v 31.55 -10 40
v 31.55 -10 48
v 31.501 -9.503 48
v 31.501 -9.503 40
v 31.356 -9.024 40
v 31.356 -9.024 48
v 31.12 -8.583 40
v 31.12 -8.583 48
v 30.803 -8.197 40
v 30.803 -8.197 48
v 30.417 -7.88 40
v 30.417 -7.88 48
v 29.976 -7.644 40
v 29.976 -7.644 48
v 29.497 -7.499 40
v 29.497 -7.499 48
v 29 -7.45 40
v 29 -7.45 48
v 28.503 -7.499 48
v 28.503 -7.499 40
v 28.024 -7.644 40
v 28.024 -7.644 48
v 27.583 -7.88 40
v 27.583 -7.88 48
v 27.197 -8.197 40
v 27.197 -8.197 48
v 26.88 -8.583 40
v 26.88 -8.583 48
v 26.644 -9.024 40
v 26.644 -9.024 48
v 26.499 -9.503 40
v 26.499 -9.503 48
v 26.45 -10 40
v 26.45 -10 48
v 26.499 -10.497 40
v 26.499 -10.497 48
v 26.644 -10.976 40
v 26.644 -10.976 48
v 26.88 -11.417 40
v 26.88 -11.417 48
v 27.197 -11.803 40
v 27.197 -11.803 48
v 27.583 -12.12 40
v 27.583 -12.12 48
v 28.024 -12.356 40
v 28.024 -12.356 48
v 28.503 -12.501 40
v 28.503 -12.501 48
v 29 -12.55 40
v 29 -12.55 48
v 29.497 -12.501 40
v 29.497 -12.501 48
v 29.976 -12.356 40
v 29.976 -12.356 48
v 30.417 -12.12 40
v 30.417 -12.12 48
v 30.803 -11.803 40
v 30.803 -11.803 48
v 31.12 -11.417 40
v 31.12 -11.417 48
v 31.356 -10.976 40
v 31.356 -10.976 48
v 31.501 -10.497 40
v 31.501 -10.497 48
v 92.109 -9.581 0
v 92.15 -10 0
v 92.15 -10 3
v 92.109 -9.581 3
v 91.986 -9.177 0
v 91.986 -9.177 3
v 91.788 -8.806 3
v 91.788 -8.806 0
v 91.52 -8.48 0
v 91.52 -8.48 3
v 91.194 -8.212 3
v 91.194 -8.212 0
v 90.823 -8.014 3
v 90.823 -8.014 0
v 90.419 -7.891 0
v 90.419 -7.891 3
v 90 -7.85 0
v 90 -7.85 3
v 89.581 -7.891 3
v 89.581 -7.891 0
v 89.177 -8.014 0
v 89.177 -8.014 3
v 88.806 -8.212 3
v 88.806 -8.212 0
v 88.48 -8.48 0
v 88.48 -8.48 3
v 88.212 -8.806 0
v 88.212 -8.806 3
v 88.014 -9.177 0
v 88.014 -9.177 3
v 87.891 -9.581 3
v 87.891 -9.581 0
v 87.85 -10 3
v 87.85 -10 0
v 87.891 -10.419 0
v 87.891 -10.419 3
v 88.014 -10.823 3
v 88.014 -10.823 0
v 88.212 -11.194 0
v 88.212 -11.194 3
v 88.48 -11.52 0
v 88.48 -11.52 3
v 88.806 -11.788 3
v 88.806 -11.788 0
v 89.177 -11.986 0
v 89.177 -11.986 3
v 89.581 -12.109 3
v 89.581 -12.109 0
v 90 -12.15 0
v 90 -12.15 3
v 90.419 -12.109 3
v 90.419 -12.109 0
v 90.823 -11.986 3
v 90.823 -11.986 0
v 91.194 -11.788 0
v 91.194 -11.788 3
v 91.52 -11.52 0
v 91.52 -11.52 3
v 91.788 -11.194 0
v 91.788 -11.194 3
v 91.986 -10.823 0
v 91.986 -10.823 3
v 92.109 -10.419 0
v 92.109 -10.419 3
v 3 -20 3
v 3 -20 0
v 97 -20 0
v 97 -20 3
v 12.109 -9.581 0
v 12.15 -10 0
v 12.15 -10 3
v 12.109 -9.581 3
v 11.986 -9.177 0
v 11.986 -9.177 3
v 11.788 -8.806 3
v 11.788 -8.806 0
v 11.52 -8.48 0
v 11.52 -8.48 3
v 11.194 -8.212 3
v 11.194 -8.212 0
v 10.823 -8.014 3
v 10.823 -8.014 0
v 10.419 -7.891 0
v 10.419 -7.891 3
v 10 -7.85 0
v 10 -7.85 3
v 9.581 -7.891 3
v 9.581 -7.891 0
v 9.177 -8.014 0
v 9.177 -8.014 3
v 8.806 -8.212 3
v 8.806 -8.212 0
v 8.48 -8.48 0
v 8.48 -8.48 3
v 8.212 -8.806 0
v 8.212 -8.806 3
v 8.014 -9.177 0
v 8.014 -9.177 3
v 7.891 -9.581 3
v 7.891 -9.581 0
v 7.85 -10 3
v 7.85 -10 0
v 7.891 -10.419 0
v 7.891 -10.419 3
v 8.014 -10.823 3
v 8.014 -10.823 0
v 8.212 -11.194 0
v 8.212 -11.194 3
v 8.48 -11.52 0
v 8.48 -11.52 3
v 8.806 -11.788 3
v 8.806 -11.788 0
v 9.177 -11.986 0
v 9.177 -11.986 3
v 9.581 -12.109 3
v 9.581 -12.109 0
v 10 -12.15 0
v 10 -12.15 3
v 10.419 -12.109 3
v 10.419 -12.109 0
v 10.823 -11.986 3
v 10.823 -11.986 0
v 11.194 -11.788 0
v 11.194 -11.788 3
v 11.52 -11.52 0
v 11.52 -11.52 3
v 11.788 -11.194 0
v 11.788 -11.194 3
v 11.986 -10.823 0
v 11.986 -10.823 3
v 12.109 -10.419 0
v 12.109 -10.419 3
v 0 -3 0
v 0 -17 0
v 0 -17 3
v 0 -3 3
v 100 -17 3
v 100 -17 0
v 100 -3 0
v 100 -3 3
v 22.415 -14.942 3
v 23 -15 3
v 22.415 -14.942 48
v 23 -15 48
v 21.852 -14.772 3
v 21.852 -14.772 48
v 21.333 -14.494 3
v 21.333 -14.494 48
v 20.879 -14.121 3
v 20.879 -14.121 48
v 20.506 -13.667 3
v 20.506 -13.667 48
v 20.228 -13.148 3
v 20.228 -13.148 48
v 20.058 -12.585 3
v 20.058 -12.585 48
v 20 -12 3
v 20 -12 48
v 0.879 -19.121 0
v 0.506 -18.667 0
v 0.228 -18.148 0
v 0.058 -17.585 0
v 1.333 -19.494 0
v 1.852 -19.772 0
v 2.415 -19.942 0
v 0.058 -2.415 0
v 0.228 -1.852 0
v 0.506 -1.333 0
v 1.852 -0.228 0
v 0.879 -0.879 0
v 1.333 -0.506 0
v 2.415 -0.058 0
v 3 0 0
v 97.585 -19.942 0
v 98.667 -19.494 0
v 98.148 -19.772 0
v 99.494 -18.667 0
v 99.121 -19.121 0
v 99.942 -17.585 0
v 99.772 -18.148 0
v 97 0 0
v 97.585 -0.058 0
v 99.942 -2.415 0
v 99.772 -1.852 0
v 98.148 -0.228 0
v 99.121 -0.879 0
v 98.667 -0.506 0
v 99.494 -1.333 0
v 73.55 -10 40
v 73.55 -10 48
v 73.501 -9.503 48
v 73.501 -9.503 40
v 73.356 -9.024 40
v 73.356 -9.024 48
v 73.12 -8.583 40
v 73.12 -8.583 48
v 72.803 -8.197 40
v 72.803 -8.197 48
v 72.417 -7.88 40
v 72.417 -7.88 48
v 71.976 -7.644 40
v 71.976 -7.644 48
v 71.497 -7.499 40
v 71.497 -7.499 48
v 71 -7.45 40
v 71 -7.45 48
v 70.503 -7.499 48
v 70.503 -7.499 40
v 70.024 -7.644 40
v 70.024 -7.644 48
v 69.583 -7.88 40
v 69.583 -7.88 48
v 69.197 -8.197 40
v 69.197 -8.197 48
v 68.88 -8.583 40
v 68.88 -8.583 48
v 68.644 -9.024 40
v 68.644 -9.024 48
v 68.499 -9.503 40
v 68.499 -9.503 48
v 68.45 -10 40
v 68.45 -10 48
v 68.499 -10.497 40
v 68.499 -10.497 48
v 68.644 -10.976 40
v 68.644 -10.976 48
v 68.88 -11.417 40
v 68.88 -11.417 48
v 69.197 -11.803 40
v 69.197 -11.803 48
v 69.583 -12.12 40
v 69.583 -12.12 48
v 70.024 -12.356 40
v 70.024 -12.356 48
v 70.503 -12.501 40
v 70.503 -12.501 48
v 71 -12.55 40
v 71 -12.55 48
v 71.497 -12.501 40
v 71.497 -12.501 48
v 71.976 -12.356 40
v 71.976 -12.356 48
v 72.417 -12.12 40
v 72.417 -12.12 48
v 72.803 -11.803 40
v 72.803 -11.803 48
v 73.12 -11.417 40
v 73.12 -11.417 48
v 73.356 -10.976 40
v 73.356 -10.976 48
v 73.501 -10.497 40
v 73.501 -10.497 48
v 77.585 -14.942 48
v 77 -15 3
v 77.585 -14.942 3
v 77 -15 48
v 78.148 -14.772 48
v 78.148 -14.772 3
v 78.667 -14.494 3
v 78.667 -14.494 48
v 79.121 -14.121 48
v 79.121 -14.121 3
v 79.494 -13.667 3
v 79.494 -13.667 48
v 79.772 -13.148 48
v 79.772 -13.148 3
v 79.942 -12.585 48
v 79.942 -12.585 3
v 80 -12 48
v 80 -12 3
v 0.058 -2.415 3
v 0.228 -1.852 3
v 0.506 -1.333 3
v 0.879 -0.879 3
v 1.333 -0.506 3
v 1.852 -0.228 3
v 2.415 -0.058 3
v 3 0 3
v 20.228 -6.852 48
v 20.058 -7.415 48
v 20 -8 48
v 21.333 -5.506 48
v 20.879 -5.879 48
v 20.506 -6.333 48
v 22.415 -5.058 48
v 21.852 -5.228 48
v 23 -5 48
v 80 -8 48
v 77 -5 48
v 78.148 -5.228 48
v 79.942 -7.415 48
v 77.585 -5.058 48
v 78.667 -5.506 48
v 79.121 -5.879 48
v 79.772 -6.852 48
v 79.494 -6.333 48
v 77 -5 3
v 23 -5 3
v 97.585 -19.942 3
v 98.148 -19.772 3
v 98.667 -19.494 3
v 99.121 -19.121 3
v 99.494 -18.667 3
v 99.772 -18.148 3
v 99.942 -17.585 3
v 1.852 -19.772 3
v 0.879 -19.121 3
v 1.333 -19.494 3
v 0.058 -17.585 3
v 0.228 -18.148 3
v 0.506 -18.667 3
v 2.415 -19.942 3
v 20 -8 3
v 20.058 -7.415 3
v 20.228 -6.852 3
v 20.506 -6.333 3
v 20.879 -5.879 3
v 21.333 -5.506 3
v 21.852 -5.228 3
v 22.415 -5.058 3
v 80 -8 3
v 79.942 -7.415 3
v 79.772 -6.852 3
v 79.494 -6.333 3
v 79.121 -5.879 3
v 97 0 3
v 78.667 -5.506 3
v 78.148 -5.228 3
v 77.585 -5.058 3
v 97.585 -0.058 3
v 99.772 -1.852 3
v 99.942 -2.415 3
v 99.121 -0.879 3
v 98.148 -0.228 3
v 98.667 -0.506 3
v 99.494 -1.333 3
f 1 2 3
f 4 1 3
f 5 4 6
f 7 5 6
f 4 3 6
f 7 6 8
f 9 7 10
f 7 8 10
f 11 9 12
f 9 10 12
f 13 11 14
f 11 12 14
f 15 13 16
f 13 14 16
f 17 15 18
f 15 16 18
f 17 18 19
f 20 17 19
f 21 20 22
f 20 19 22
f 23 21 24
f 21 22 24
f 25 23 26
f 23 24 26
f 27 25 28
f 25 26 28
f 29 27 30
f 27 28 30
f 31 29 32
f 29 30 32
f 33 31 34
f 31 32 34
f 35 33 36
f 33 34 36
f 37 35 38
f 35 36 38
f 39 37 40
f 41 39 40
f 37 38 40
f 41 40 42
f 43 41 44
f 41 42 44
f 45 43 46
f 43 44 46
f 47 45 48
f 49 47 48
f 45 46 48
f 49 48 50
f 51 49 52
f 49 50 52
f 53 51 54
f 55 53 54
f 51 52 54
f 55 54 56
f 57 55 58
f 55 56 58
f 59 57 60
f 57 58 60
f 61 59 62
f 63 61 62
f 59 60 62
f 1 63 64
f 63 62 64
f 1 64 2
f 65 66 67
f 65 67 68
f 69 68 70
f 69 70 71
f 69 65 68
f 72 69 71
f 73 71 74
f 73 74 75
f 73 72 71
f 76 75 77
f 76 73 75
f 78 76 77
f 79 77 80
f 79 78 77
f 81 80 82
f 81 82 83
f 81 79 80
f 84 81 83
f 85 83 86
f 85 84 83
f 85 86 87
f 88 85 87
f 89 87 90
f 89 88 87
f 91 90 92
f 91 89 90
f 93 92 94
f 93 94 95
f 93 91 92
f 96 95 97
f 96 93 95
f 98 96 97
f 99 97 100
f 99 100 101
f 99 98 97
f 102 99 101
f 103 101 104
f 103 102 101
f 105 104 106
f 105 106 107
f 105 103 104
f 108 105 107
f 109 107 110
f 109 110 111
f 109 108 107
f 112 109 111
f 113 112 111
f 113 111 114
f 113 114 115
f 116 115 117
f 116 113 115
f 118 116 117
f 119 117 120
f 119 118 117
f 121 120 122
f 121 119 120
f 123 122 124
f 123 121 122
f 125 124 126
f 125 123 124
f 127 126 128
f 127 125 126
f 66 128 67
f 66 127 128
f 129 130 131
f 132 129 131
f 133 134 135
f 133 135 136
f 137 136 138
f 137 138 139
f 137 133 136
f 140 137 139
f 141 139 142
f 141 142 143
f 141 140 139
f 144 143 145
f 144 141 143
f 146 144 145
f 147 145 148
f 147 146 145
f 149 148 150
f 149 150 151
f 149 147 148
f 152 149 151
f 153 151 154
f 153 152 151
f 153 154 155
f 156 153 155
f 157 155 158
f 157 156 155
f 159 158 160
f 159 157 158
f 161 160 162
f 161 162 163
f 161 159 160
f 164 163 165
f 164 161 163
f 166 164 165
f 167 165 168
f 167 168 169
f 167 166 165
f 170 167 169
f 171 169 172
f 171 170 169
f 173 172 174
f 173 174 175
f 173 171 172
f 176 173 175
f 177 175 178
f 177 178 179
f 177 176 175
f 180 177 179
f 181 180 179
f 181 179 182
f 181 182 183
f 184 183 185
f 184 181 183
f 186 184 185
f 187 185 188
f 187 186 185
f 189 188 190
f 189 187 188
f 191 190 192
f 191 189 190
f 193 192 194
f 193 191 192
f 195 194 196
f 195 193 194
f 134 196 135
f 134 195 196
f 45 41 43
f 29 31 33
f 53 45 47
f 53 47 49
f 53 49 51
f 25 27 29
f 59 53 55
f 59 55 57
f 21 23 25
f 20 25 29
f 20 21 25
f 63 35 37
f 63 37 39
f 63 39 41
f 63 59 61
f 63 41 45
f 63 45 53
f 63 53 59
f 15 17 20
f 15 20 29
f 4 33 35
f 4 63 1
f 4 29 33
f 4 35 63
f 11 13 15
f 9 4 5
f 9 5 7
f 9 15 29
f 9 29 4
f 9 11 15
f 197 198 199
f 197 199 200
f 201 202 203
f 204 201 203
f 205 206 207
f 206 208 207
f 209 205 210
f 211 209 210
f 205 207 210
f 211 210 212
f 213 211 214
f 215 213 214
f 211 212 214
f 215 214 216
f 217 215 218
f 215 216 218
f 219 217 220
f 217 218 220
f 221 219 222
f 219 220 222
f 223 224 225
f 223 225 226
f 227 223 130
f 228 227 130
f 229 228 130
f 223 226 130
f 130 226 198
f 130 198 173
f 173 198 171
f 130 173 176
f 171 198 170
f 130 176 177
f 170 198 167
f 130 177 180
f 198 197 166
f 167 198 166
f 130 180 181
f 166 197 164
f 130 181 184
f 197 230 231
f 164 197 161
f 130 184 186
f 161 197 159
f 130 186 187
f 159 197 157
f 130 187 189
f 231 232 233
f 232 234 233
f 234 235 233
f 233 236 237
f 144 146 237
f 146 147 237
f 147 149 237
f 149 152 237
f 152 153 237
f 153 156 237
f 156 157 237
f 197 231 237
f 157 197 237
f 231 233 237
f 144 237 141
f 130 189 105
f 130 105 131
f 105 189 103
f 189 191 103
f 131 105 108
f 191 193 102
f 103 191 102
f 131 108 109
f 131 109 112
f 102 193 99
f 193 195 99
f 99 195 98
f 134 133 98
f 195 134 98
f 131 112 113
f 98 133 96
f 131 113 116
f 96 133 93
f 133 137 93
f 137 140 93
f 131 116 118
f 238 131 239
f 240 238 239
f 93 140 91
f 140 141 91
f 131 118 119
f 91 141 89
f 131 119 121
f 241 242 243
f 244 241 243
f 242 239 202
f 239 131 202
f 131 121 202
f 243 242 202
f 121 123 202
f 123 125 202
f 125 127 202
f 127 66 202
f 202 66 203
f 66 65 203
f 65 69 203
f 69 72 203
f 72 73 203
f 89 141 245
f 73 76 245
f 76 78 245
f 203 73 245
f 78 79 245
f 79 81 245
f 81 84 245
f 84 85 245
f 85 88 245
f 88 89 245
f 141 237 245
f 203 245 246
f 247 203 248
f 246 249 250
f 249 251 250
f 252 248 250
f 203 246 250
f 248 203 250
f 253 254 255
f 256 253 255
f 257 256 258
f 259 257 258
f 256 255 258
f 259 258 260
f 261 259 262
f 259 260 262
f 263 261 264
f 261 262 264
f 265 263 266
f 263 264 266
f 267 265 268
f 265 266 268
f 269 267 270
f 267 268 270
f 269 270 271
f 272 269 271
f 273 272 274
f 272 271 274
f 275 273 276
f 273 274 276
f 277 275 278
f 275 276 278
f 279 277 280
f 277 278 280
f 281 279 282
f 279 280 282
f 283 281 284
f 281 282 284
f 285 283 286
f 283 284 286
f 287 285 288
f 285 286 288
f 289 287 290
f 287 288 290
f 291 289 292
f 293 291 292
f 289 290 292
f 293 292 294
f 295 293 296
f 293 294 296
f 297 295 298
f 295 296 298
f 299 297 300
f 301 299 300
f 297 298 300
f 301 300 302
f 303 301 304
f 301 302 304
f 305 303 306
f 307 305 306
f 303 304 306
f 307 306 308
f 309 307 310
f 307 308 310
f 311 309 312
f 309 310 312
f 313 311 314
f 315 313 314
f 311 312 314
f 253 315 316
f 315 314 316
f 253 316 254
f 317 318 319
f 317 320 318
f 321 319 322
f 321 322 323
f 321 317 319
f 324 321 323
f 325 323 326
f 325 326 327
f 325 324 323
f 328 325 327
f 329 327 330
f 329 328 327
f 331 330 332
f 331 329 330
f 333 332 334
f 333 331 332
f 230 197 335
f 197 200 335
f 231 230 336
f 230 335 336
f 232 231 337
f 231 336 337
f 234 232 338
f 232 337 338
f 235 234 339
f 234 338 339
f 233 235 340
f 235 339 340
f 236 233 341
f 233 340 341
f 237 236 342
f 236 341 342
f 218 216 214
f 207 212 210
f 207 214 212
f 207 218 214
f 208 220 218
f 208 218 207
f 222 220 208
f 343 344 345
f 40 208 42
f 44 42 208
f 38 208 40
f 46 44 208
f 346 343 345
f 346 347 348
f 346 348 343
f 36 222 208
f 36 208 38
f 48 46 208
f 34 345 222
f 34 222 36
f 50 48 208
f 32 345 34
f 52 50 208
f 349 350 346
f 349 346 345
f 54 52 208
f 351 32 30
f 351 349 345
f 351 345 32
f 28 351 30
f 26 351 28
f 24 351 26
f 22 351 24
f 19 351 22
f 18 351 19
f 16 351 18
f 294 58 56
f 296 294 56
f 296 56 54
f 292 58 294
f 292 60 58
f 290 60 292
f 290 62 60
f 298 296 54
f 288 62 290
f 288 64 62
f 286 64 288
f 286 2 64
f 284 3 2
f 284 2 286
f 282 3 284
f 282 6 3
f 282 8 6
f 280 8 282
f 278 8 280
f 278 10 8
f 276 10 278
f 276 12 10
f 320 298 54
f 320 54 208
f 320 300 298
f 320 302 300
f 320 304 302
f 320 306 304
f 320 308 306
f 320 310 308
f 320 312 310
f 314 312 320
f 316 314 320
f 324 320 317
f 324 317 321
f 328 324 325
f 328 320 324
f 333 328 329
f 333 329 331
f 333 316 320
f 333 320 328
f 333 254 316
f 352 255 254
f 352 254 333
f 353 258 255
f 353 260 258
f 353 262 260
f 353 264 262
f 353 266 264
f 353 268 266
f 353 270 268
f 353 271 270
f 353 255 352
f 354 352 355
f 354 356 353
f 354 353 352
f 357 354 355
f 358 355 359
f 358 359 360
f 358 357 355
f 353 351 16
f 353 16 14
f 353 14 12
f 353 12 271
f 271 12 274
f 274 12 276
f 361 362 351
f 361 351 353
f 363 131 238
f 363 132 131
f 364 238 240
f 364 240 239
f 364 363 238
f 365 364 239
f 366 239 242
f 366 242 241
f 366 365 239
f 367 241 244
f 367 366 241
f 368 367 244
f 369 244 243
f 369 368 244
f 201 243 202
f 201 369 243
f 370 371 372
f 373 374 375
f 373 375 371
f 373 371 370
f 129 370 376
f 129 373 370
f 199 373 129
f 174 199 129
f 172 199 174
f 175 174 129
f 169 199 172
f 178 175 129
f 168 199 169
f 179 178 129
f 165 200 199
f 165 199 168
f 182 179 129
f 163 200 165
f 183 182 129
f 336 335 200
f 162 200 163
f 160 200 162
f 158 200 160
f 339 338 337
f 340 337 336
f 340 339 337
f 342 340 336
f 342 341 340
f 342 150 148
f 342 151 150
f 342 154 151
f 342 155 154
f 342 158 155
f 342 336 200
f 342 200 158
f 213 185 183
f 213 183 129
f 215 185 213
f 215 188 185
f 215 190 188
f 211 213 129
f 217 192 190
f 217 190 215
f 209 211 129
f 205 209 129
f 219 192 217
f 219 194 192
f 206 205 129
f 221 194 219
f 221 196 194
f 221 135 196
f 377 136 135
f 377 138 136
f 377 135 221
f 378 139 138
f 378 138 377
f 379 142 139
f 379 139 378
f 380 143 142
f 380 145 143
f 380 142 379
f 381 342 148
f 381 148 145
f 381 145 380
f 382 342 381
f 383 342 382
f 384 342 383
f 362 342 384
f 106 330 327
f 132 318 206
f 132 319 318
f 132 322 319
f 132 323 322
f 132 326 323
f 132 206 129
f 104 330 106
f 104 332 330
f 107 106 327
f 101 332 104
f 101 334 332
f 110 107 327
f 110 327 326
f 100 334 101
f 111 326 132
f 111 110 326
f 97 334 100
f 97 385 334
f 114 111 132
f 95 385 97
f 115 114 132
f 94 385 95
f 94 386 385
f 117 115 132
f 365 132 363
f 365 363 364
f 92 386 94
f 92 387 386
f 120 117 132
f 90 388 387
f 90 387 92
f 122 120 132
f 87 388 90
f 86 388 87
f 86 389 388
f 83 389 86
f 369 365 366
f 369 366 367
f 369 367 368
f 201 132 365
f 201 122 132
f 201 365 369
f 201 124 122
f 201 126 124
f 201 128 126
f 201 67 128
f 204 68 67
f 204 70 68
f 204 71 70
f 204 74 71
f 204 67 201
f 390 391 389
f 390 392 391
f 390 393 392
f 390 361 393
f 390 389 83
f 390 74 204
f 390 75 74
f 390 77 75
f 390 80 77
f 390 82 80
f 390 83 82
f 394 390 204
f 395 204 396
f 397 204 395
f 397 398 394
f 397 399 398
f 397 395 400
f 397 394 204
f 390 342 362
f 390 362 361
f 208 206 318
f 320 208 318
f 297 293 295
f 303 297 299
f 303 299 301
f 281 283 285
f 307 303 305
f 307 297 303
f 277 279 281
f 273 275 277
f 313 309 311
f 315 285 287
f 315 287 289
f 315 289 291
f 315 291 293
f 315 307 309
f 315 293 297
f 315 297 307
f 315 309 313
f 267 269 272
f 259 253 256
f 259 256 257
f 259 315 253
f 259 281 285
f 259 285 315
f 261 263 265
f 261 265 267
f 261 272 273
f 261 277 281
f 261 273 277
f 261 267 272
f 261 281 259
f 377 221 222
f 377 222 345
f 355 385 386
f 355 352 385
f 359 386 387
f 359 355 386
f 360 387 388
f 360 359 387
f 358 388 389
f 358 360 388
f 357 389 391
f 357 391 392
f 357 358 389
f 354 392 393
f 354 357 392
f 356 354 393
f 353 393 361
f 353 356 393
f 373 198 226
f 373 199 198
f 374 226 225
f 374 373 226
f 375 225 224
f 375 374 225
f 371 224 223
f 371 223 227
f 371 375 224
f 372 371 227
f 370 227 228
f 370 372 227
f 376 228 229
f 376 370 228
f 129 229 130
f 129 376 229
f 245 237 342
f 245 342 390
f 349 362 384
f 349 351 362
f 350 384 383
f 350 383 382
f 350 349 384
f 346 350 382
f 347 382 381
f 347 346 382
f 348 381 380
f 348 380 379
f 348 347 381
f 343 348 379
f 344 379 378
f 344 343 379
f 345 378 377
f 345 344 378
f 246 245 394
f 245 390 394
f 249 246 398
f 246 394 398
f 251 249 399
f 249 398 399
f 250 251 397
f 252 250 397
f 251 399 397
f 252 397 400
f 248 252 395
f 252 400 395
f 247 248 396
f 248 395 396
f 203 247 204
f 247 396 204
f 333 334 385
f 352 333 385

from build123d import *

# Parameters (mm, degrees)
SKETCH1_W           = 100
SKETCH1_H           = 20
SKETCH1_R           = 2.15
SKETCH1_R_2         = 2.55
BOSS_EXTRUDE1_DEPTH = 3
SKETCH2_R           = 2.55
BOSS_EXTRUDE3_DEPTH = 3
SKETCH3_W           = 60
SKETCH3_H           = 10
BOSS_EXTRUDE4_DEPTH = 45
SKETCH4_R           = 2.55
CUT_EXTRUDE3_DEPTH  = 8
FILLET1_R           = 3


with BuildPart() as part:
    # Sketch1 → Boss-Extrude1 (new body)
    with BuildSketch(Plane.XY):
        with Locations((50, -10)):
            Rectangle(SKETCH1_W, SKETCH1_H)
        with Locations((10, -10)):
            Circle(SKETCH1_R, mode=Mode.SUBTRACT)
        with Locations((90, -10)):
            Circle(SKETCH1_R, mode=Mode.SUBTRACT)
        with Locations((29, -10)):
            Circle(SKETCH1_R_2, mode=Mode.SUBTRACT)
        with Locations((71, -10)):
            Circle(SKETCH1_R_2, mode=Mode.SUBTRACT)
    extrude(amount=BOSS_EXTRUDE1_DEPTH)

    # Sketch2 → Boss-Extrude3 (add)
    with BuildSketch(Plane.XY.offset(3)):
        with Locations((71, -10)):
            Circle(SKETCH2_R)
        with Locations((29, -10)):
            Circle(SKETCH2_R)
    extrude(amount=-BOSS_EXTRUDE3_DEPTH)

    # Sketch3 → Boss-Extrude4 (add)
    with BuildSketch(Plane.XY.offset(3)):
        with Locations((50, -10)):
            Rectangle(SKETCH3_W, SKETCH3_H)
    extrude(amount=BOSS_EXTRUDE4_DEPTH)

    # Sketch4 → Cut-Extrude3 (cut)
    with BuildSketch(Plane.XY.offset(48)):
        with Locations((71, -10)):
            Circle(SKETCH4_R)
        with Locations((29, -10)):
            Circle(SKETCH4_R)
    extrude(amount=-CUT_EXTRUDE3_DEPTH, mode=Mode.SUBTRACT)

    # Fillet1
    fillet1_edges = [part.edges().sort_by_distance(p)[0] for p in [
        (80, -15, 25.5),
        (80, -5, 25.5),
        (20, -5, 25.5),
        (20, -15, 25.5),
        (0, 0, 1.5),
        (100, 0, 1.5),
        (100, -20, 1.5),
        (0, -20, 1.5),
    ]]
    fillet(fillet1_edges, radius=FILLET1_R)


solid = part.part
